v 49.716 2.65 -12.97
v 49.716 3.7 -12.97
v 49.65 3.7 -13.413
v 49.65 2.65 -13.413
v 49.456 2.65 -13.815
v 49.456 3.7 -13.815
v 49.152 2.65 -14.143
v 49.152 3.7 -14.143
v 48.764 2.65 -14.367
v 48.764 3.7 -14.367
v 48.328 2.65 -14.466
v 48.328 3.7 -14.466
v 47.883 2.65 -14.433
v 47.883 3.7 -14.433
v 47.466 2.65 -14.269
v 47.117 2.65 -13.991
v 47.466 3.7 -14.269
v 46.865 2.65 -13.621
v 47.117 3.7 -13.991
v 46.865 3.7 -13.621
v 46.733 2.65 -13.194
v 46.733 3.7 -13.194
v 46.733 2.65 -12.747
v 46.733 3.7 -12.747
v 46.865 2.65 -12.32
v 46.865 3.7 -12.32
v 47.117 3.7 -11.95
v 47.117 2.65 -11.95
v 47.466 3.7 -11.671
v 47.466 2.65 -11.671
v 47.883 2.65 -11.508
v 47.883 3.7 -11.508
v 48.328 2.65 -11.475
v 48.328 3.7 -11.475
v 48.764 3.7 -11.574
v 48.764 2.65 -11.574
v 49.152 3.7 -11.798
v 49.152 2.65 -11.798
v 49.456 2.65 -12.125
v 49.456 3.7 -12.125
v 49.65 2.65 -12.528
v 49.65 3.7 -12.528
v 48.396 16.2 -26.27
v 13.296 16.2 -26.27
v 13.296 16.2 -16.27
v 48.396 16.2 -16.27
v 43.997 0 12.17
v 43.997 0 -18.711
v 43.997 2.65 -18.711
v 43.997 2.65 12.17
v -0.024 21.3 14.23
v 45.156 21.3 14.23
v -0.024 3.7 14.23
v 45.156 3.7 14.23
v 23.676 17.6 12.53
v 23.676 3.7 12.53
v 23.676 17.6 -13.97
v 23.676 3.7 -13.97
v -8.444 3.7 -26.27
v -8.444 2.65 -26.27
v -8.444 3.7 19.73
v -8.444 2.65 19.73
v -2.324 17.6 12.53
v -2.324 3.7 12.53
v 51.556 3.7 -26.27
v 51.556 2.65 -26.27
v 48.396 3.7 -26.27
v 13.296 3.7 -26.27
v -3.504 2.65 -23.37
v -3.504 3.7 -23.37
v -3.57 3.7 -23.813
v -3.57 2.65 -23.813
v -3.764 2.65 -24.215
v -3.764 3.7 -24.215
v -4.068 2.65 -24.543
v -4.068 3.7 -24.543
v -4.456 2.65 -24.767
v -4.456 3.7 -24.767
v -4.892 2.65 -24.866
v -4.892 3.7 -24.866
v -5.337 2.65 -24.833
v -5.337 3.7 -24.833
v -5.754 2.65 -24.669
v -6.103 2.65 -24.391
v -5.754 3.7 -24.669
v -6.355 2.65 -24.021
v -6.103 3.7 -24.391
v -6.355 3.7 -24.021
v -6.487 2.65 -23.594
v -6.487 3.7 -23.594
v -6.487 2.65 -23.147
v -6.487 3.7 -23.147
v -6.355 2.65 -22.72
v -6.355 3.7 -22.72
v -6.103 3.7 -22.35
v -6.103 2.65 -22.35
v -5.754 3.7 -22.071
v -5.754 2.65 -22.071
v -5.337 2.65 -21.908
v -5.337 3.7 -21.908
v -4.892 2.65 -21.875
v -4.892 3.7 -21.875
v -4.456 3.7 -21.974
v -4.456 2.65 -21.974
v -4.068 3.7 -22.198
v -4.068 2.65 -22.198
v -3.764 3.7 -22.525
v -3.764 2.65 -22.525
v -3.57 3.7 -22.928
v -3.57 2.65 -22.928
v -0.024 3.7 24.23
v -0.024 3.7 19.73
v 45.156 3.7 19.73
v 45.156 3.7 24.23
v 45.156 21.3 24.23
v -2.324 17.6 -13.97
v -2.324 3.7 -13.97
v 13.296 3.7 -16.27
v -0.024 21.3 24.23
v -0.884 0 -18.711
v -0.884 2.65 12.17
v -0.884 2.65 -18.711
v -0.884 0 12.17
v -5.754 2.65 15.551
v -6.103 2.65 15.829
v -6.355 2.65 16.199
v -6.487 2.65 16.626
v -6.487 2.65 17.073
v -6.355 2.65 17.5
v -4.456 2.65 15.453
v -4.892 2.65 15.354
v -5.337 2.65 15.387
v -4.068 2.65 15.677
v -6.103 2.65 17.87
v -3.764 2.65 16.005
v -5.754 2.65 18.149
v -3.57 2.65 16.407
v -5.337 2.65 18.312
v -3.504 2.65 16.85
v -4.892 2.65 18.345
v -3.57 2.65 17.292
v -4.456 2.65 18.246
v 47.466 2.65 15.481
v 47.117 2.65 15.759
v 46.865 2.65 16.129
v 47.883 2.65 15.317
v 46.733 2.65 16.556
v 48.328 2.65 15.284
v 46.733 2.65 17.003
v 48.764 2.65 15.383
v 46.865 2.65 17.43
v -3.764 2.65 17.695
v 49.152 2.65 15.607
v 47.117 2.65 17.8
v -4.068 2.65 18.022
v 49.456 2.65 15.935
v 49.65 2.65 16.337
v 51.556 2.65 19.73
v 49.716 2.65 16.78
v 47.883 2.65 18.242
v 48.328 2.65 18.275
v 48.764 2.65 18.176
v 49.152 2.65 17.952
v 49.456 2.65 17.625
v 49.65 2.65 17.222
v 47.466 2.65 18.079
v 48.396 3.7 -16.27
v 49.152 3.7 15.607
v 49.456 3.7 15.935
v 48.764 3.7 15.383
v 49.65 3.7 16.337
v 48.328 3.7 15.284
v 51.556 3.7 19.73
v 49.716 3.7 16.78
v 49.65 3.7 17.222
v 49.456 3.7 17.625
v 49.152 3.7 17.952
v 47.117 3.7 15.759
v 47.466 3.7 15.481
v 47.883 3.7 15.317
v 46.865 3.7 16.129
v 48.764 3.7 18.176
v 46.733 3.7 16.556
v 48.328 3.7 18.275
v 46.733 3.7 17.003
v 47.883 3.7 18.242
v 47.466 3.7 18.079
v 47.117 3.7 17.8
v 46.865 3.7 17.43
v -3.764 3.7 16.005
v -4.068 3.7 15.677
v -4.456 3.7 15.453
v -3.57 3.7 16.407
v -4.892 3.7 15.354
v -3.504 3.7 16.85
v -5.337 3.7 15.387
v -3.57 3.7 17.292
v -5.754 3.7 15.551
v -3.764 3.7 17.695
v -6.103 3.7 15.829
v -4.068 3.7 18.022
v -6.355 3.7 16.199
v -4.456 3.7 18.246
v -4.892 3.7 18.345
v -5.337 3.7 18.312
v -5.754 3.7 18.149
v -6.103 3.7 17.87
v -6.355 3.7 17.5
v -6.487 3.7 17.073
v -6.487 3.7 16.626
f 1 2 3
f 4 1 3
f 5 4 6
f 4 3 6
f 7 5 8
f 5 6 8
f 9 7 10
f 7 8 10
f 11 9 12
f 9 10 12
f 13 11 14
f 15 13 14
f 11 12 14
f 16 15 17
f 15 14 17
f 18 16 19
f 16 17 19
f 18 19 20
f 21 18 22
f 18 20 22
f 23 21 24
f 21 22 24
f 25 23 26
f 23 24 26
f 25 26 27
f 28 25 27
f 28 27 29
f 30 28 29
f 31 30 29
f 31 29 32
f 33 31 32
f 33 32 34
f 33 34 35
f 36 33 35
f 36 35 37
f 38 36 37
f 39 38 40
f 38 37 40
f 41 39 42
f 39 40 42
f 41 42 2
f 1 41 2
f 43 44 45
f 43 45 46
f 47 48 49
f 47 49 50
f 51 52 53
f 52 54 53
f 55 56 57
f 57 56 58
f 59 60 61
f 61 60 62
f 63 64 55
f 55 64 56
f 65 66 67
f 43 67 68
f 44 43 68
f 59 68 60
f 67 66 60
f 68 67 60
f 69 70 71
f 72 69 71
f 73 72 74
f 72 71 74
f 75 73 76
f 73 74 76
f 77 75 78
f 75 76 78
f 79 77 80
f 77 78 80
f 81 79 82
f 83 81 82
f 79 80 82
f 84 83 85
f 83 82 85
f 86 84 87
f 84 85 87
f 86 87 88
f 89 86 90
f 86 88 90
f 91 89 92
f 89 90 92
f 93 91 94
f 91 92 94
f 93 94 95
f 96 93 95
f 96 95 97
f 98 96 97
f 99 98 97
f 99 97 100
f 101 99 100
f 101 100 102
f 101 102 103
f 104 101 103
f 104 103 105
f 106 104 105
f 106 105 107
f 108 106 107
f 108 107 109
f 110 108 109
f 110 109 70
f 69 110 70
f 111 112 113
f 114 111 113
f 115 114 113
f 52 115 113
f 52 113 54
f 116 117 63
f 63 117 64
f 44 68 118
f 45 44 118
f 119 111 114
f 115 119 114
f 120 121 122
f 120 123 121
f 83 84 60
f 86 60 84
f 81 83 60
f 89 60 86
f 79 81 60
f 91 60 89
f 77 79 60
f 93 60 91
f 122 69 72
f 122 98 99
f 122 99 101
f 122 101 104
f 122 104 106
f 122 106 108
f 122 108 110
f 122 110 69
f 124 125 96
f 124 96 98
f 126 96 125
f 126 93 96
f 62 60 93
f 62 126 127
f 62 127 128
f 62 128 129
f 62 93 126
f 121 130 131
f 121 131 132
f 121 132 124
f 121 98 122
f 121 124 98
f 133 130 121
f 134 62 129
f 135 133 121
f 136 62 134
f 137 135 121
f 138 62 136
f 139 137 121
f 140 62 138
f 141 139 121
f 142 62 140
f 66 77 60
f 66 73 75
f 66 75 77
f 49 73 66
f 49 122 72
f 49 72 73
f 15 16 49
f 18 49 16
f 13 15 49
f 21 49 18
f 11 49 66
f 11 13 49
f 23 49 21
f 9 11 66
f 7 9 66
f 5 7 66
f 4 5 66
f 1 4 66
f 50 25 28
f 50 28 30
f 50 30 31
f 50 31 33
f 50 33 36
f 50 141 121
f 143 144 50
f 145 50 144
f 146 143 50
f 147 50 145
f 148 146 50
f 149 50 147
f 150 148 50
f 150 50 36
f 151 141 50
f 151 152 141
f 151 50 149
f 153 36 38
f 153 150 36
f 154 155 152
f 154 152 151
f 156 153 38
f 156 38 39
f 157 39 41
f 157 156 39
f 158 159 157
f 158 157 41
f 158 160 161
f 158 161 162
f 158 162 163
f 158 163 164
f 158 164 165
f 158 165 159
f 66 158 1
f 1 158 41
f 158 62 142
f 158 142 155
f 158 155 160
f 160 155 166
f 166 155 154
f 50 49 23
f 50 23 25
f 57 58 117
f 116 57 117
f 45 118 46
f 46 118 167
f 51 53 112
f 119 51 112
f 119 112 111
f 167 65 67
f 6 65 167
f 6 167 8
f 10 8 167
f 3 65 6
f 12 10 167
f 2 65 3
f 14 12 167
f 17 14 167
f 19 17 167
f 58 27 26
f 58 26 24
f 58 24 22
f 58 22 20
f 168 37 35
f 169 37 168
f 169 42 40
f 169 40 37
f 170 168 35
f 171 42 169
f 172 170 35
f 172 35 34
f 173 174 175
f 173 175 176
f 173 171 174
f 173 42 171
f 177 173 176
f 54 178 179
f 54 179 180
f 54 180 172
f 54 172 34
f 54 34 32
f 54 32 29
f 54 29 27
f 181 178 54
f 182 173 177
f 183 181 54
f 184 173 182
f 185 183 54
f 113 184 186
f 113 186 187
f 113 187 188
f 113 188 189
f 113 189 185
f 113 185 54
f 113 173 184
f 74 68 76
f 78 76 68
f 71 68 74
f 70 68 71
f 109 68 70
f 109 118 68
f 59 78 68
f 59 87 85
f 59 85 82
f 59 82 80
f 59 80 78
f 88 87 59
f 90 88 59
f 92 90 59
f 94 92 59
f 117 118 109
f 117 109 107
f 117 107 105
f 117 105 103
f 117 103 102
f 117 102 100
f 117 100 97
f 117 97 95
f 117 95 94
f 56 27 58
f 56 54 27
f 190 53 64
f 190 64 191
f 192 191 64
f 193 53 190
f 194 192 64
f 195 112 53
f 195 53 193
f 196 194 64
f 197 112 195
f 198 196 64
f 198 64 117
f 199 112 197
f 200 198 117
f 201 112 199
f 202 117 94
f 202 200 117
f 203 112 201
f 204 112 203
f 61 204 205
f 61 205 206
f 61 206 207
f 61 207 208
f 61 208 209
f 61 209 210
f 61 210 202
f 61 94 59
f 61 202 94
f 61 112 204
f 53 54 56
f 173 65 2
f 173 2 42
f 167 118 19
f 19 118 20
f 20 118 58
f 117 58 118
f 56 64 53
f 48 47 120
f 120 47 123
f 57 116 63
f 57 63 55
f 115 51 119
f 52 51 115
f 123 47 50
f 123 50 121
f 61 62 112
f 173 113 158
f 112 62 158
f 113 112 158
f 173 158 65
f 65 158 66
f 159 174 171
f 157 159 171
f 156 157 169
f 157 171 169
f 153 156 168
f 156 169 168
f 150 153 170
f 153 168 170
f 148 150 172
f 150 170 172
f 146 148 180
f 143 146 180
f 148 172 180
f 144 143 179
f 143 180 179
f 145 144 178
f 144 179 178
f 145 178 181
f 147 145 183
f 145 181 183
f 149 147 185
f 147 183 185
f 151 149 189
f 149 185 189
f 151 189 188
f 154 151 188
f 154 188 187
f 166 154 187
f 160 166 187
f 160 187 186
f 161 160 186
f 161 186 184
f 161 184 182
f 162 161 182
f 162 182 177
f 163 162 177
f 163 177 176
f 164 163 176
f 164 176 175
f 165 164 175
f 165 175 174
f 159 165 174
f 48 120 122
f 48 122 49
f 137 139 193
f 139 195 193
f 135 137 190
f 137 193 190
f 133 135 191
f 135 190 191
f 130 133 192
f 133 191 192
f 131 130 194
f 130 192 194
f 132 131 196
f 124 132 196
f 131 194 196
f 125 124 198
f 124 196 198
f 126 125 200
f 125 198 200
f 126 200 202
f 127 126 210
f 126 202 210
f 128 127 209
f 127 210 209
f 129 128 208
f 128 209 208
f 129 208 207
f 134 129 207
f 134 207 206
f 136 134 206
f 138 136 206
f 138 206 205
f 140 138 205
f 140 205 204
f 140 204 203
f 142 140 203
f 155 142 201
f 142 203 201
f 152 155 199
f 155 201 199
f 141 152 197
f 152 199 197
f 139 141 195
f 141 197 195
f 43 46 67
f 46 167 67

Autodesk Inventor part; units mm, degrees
ref_plane "YZ Plane" through (0, 0, 0) normal (1, 0, 0) x (0, 1, 0)
ref_plane "XZ Plane" through (0, 0, 0) normal (0, 1, 0) x (-1, 0, 0)
ref_plane "XY Plane" through (0, 0, 0) normal (0, 0, 1) x (1, 0, 0)
sketch "Sketch1" plane through (0, 0, 0) normal (0, 1, 0) x (-1, 0, 0)
  line L0 (8.4436, 19.7296) -> (-51.5564, 19.7296)
  line L1 (-51.5564, 19.7296) -> (-51.5564, -26.2704)
  line L2 (-51.5564, -26.2704) -> (8.4436, -26.2704)
  line L3 (8.4436, -26.2704) -> (8.4436, 19.7296)
  point P0 (0, 0)
  dimension "d0" = 60
  dimension "d1" = 46
extrude "Extrusion1" add sketch "Sketch1" along normal blind 3.7
sketch "Sketch2" plane through (0, 3.7, 0) normal (0, 1, 0) x (1, 0, 0)
  line L0 (-8.4436, -19.7296) -> (51.5564, -19.7296) projected
  line L1 (-8.4436, 26.2704) -> (-8.4436, -19.7296) projected
  line L2 (51.5564, -19.7296) -> (51.5564, 26.2704) projected
  line L3 (-8.4436, -19.7296) -> (-0.0236, -19.7296)
  line L4 (51.5564, -19.7296) -> (45.1564, -19.7296)
  line L5 (45.1564, -19.7296) -> (45.1564, -14.2296)
  line L6 (45.1564, -14.2296) -> (-0.0236, -14.2296)
  line L7 (-0.0236, -14.2296) -> (-0.0236, -24.2296)
  line L8 (-0.0236, -24.2296) -> (45.1564, -24.2296)
  line L9 (45.1564, -24.2296) -> (45.1564, -14.2296)
  point P0 (0, 0)
  dimension "d4" = 8.42
  dimension "d5" = 6.4
  dimension "d6" = 5.5
  dimension "d7" = 10
extrude "Extrusion2" add sketch "Sketch2" along normal blind 17.6
sketch "Sketch3" plane through (0, 3.7, 0) normal (0, 1, 0) x (1, 0, 0)
  line L0 (-8.4436, 26.2704) -> (-8.4436, -19.7296) projected
  line L1 (-2.3236, 26.2704) -> (-2.3236, -19.7296)
  line L2 (45.1564, -14.2296) -> (-0.0236, -14.2296) projected
  line L3 (45.1564, -12.5296) -> (-0.0236, -12.5296)
  line L4 (-2.3236, -12.5296) -> (23.6764, -12.5296)
  line L5 (23.6764, -12.5296) -> (23.6764, 13.9704)
  line L6 (23.6764, 13.9704) -> (-2.3236, 13.9704)
  line L7 (-2.3236, 13.9704) -> (-2.3236, -12.5296)
  point P0 (0, 0)
  dimension "d10" = 6.12
  dimension "d11" = 1.7
  dimension "d12" = 26
  dimension "d13" = 26.5
extrude "Extrusion3" add sketch "Sketch3" along normal blind 13.9
sketch "Sketch4" plane through (0, 3.7, 0) normal (0, 1, 0) x (1, 0, 0)
  line L0 (-8.4436, -19.7296) -> (-0.0236, -19.7296) projected
  line L1 (-6.5036, 26.2704) -> (-6.5036, -17.7896)
  line L2 (-0.0236, -18.3496) -> (-7.0636, -18.3496)
  circle A0 centre (-5.0036, -16.8496) radius 1.5
  line L3 (51.5564, 26.2704) -> (-8.4436, 26.2704) projected
  line L4 (51.5564, 24.8704) -> (-7.0436, 24.8704)
  circle A1 centre (-5.0036, 23.3704) radius 1.5
  line L5 (49.7164, -19.7296) -> (49.7164, 24.4304)
  line L6 (-0.0236, -41.0522) -> (-29.7662, -41.0522)
  line L7 (-29.7662, -41.0522) -> (-29.7662, 47.593)
  line L8 (-29.7662, 47.593) -> (72.879, 47.593)
  line L9 (72.879, 47.593) -> (72.879, -19.7296)
  line L10 (45.1564, -19.7296) -> (51.5564, -19.7296) projected
  line L11 (45.1564, -18.2796) -> (50.1064, -18.2796)
  circle A2 centre (48.2164, -16.7796) radius 1.5
  line L12 (51.5564, 14.4704) -> (-7.0436, 14.4704)
  circle A3 centre (48.2164, 12.9704) radius 1.5
  point P0 (0, 0)
  dimension "d17" = 1.38
  dimension "d18" = 3
  dimension "d19" = 1.4
  dimension "d20" = 3
  dimension "d22" = 1.45
  dimension "d23" = 3
  dimension "d24" = 10.4
  dimension "d25" = 3
extrude "Extrusion4" cut sketch "Sketch4" against normal blind 13.9 contours A2 | A3 | A0 | A1
sketch "Sketch5" plane through (0, 0, 0) normal (0, -1, 0) x (1, 0, 0)
  line L0 (51.5564, 19.7296) -> (51.5564, -26.2704) projected
  line L1 (-8.4436, 19.7296) -> (51.5564, 19.7296) projected
  line L2 (-8.4436, -26.2704) -> (-8.4436, 19.7296) projected
  line L3 (51.5564, -26.2704) -> (-8.4436, -26.2704) projected
  line L4 (43.9969, -18.7109) -> (43.9969, 12.1701)
  line L5 (43.9969, 12.1701) -> (-0.8841, 12.1701)
  line L6 (-0.8841, 12.1701) -> (-0.8841, -18.7109)
  line L7 (-0.8841, -18.7109) -> (43.9969, -18.7109)
  point P0 (0, 0)
extrude "Extrusion5" cut sketch "Sketch5" against normal blind 2.65
sketch "Sketch6" plane through (0, 3.7, 0) normal (0, 1, 0) x (1, 0, 0)
  line L0 (51.5564, -19.7296) -> (51.5564, 26.2704) projected
  line L1 (48.3964, -19.7296) -> (48.3964, 26.2704)
  line L2 (51.5564, 26.2704) -> (-8.4436, 26.2704) projected
  line L3 (48.3964, 26.2704) -> (13.2964, 26.2704)
  line L4 (13.2964, 26.2704) -> (13.2964, 16.2704)
  line L5 (13.2964, 16.2704) -> (48.3964, 16.2704)
  line L6 (48.3964, 16.2704) -> (48.3964, 26.2704)
  point P0 (0, 0)
  dimension "d30" = 3.16
  dimension "d31" = 35.1
  dimension "d32" = 10
extrude "Extrusion6" add sketch "Sketch6" along normal blind 12.5
properties part number "CapCharger"
